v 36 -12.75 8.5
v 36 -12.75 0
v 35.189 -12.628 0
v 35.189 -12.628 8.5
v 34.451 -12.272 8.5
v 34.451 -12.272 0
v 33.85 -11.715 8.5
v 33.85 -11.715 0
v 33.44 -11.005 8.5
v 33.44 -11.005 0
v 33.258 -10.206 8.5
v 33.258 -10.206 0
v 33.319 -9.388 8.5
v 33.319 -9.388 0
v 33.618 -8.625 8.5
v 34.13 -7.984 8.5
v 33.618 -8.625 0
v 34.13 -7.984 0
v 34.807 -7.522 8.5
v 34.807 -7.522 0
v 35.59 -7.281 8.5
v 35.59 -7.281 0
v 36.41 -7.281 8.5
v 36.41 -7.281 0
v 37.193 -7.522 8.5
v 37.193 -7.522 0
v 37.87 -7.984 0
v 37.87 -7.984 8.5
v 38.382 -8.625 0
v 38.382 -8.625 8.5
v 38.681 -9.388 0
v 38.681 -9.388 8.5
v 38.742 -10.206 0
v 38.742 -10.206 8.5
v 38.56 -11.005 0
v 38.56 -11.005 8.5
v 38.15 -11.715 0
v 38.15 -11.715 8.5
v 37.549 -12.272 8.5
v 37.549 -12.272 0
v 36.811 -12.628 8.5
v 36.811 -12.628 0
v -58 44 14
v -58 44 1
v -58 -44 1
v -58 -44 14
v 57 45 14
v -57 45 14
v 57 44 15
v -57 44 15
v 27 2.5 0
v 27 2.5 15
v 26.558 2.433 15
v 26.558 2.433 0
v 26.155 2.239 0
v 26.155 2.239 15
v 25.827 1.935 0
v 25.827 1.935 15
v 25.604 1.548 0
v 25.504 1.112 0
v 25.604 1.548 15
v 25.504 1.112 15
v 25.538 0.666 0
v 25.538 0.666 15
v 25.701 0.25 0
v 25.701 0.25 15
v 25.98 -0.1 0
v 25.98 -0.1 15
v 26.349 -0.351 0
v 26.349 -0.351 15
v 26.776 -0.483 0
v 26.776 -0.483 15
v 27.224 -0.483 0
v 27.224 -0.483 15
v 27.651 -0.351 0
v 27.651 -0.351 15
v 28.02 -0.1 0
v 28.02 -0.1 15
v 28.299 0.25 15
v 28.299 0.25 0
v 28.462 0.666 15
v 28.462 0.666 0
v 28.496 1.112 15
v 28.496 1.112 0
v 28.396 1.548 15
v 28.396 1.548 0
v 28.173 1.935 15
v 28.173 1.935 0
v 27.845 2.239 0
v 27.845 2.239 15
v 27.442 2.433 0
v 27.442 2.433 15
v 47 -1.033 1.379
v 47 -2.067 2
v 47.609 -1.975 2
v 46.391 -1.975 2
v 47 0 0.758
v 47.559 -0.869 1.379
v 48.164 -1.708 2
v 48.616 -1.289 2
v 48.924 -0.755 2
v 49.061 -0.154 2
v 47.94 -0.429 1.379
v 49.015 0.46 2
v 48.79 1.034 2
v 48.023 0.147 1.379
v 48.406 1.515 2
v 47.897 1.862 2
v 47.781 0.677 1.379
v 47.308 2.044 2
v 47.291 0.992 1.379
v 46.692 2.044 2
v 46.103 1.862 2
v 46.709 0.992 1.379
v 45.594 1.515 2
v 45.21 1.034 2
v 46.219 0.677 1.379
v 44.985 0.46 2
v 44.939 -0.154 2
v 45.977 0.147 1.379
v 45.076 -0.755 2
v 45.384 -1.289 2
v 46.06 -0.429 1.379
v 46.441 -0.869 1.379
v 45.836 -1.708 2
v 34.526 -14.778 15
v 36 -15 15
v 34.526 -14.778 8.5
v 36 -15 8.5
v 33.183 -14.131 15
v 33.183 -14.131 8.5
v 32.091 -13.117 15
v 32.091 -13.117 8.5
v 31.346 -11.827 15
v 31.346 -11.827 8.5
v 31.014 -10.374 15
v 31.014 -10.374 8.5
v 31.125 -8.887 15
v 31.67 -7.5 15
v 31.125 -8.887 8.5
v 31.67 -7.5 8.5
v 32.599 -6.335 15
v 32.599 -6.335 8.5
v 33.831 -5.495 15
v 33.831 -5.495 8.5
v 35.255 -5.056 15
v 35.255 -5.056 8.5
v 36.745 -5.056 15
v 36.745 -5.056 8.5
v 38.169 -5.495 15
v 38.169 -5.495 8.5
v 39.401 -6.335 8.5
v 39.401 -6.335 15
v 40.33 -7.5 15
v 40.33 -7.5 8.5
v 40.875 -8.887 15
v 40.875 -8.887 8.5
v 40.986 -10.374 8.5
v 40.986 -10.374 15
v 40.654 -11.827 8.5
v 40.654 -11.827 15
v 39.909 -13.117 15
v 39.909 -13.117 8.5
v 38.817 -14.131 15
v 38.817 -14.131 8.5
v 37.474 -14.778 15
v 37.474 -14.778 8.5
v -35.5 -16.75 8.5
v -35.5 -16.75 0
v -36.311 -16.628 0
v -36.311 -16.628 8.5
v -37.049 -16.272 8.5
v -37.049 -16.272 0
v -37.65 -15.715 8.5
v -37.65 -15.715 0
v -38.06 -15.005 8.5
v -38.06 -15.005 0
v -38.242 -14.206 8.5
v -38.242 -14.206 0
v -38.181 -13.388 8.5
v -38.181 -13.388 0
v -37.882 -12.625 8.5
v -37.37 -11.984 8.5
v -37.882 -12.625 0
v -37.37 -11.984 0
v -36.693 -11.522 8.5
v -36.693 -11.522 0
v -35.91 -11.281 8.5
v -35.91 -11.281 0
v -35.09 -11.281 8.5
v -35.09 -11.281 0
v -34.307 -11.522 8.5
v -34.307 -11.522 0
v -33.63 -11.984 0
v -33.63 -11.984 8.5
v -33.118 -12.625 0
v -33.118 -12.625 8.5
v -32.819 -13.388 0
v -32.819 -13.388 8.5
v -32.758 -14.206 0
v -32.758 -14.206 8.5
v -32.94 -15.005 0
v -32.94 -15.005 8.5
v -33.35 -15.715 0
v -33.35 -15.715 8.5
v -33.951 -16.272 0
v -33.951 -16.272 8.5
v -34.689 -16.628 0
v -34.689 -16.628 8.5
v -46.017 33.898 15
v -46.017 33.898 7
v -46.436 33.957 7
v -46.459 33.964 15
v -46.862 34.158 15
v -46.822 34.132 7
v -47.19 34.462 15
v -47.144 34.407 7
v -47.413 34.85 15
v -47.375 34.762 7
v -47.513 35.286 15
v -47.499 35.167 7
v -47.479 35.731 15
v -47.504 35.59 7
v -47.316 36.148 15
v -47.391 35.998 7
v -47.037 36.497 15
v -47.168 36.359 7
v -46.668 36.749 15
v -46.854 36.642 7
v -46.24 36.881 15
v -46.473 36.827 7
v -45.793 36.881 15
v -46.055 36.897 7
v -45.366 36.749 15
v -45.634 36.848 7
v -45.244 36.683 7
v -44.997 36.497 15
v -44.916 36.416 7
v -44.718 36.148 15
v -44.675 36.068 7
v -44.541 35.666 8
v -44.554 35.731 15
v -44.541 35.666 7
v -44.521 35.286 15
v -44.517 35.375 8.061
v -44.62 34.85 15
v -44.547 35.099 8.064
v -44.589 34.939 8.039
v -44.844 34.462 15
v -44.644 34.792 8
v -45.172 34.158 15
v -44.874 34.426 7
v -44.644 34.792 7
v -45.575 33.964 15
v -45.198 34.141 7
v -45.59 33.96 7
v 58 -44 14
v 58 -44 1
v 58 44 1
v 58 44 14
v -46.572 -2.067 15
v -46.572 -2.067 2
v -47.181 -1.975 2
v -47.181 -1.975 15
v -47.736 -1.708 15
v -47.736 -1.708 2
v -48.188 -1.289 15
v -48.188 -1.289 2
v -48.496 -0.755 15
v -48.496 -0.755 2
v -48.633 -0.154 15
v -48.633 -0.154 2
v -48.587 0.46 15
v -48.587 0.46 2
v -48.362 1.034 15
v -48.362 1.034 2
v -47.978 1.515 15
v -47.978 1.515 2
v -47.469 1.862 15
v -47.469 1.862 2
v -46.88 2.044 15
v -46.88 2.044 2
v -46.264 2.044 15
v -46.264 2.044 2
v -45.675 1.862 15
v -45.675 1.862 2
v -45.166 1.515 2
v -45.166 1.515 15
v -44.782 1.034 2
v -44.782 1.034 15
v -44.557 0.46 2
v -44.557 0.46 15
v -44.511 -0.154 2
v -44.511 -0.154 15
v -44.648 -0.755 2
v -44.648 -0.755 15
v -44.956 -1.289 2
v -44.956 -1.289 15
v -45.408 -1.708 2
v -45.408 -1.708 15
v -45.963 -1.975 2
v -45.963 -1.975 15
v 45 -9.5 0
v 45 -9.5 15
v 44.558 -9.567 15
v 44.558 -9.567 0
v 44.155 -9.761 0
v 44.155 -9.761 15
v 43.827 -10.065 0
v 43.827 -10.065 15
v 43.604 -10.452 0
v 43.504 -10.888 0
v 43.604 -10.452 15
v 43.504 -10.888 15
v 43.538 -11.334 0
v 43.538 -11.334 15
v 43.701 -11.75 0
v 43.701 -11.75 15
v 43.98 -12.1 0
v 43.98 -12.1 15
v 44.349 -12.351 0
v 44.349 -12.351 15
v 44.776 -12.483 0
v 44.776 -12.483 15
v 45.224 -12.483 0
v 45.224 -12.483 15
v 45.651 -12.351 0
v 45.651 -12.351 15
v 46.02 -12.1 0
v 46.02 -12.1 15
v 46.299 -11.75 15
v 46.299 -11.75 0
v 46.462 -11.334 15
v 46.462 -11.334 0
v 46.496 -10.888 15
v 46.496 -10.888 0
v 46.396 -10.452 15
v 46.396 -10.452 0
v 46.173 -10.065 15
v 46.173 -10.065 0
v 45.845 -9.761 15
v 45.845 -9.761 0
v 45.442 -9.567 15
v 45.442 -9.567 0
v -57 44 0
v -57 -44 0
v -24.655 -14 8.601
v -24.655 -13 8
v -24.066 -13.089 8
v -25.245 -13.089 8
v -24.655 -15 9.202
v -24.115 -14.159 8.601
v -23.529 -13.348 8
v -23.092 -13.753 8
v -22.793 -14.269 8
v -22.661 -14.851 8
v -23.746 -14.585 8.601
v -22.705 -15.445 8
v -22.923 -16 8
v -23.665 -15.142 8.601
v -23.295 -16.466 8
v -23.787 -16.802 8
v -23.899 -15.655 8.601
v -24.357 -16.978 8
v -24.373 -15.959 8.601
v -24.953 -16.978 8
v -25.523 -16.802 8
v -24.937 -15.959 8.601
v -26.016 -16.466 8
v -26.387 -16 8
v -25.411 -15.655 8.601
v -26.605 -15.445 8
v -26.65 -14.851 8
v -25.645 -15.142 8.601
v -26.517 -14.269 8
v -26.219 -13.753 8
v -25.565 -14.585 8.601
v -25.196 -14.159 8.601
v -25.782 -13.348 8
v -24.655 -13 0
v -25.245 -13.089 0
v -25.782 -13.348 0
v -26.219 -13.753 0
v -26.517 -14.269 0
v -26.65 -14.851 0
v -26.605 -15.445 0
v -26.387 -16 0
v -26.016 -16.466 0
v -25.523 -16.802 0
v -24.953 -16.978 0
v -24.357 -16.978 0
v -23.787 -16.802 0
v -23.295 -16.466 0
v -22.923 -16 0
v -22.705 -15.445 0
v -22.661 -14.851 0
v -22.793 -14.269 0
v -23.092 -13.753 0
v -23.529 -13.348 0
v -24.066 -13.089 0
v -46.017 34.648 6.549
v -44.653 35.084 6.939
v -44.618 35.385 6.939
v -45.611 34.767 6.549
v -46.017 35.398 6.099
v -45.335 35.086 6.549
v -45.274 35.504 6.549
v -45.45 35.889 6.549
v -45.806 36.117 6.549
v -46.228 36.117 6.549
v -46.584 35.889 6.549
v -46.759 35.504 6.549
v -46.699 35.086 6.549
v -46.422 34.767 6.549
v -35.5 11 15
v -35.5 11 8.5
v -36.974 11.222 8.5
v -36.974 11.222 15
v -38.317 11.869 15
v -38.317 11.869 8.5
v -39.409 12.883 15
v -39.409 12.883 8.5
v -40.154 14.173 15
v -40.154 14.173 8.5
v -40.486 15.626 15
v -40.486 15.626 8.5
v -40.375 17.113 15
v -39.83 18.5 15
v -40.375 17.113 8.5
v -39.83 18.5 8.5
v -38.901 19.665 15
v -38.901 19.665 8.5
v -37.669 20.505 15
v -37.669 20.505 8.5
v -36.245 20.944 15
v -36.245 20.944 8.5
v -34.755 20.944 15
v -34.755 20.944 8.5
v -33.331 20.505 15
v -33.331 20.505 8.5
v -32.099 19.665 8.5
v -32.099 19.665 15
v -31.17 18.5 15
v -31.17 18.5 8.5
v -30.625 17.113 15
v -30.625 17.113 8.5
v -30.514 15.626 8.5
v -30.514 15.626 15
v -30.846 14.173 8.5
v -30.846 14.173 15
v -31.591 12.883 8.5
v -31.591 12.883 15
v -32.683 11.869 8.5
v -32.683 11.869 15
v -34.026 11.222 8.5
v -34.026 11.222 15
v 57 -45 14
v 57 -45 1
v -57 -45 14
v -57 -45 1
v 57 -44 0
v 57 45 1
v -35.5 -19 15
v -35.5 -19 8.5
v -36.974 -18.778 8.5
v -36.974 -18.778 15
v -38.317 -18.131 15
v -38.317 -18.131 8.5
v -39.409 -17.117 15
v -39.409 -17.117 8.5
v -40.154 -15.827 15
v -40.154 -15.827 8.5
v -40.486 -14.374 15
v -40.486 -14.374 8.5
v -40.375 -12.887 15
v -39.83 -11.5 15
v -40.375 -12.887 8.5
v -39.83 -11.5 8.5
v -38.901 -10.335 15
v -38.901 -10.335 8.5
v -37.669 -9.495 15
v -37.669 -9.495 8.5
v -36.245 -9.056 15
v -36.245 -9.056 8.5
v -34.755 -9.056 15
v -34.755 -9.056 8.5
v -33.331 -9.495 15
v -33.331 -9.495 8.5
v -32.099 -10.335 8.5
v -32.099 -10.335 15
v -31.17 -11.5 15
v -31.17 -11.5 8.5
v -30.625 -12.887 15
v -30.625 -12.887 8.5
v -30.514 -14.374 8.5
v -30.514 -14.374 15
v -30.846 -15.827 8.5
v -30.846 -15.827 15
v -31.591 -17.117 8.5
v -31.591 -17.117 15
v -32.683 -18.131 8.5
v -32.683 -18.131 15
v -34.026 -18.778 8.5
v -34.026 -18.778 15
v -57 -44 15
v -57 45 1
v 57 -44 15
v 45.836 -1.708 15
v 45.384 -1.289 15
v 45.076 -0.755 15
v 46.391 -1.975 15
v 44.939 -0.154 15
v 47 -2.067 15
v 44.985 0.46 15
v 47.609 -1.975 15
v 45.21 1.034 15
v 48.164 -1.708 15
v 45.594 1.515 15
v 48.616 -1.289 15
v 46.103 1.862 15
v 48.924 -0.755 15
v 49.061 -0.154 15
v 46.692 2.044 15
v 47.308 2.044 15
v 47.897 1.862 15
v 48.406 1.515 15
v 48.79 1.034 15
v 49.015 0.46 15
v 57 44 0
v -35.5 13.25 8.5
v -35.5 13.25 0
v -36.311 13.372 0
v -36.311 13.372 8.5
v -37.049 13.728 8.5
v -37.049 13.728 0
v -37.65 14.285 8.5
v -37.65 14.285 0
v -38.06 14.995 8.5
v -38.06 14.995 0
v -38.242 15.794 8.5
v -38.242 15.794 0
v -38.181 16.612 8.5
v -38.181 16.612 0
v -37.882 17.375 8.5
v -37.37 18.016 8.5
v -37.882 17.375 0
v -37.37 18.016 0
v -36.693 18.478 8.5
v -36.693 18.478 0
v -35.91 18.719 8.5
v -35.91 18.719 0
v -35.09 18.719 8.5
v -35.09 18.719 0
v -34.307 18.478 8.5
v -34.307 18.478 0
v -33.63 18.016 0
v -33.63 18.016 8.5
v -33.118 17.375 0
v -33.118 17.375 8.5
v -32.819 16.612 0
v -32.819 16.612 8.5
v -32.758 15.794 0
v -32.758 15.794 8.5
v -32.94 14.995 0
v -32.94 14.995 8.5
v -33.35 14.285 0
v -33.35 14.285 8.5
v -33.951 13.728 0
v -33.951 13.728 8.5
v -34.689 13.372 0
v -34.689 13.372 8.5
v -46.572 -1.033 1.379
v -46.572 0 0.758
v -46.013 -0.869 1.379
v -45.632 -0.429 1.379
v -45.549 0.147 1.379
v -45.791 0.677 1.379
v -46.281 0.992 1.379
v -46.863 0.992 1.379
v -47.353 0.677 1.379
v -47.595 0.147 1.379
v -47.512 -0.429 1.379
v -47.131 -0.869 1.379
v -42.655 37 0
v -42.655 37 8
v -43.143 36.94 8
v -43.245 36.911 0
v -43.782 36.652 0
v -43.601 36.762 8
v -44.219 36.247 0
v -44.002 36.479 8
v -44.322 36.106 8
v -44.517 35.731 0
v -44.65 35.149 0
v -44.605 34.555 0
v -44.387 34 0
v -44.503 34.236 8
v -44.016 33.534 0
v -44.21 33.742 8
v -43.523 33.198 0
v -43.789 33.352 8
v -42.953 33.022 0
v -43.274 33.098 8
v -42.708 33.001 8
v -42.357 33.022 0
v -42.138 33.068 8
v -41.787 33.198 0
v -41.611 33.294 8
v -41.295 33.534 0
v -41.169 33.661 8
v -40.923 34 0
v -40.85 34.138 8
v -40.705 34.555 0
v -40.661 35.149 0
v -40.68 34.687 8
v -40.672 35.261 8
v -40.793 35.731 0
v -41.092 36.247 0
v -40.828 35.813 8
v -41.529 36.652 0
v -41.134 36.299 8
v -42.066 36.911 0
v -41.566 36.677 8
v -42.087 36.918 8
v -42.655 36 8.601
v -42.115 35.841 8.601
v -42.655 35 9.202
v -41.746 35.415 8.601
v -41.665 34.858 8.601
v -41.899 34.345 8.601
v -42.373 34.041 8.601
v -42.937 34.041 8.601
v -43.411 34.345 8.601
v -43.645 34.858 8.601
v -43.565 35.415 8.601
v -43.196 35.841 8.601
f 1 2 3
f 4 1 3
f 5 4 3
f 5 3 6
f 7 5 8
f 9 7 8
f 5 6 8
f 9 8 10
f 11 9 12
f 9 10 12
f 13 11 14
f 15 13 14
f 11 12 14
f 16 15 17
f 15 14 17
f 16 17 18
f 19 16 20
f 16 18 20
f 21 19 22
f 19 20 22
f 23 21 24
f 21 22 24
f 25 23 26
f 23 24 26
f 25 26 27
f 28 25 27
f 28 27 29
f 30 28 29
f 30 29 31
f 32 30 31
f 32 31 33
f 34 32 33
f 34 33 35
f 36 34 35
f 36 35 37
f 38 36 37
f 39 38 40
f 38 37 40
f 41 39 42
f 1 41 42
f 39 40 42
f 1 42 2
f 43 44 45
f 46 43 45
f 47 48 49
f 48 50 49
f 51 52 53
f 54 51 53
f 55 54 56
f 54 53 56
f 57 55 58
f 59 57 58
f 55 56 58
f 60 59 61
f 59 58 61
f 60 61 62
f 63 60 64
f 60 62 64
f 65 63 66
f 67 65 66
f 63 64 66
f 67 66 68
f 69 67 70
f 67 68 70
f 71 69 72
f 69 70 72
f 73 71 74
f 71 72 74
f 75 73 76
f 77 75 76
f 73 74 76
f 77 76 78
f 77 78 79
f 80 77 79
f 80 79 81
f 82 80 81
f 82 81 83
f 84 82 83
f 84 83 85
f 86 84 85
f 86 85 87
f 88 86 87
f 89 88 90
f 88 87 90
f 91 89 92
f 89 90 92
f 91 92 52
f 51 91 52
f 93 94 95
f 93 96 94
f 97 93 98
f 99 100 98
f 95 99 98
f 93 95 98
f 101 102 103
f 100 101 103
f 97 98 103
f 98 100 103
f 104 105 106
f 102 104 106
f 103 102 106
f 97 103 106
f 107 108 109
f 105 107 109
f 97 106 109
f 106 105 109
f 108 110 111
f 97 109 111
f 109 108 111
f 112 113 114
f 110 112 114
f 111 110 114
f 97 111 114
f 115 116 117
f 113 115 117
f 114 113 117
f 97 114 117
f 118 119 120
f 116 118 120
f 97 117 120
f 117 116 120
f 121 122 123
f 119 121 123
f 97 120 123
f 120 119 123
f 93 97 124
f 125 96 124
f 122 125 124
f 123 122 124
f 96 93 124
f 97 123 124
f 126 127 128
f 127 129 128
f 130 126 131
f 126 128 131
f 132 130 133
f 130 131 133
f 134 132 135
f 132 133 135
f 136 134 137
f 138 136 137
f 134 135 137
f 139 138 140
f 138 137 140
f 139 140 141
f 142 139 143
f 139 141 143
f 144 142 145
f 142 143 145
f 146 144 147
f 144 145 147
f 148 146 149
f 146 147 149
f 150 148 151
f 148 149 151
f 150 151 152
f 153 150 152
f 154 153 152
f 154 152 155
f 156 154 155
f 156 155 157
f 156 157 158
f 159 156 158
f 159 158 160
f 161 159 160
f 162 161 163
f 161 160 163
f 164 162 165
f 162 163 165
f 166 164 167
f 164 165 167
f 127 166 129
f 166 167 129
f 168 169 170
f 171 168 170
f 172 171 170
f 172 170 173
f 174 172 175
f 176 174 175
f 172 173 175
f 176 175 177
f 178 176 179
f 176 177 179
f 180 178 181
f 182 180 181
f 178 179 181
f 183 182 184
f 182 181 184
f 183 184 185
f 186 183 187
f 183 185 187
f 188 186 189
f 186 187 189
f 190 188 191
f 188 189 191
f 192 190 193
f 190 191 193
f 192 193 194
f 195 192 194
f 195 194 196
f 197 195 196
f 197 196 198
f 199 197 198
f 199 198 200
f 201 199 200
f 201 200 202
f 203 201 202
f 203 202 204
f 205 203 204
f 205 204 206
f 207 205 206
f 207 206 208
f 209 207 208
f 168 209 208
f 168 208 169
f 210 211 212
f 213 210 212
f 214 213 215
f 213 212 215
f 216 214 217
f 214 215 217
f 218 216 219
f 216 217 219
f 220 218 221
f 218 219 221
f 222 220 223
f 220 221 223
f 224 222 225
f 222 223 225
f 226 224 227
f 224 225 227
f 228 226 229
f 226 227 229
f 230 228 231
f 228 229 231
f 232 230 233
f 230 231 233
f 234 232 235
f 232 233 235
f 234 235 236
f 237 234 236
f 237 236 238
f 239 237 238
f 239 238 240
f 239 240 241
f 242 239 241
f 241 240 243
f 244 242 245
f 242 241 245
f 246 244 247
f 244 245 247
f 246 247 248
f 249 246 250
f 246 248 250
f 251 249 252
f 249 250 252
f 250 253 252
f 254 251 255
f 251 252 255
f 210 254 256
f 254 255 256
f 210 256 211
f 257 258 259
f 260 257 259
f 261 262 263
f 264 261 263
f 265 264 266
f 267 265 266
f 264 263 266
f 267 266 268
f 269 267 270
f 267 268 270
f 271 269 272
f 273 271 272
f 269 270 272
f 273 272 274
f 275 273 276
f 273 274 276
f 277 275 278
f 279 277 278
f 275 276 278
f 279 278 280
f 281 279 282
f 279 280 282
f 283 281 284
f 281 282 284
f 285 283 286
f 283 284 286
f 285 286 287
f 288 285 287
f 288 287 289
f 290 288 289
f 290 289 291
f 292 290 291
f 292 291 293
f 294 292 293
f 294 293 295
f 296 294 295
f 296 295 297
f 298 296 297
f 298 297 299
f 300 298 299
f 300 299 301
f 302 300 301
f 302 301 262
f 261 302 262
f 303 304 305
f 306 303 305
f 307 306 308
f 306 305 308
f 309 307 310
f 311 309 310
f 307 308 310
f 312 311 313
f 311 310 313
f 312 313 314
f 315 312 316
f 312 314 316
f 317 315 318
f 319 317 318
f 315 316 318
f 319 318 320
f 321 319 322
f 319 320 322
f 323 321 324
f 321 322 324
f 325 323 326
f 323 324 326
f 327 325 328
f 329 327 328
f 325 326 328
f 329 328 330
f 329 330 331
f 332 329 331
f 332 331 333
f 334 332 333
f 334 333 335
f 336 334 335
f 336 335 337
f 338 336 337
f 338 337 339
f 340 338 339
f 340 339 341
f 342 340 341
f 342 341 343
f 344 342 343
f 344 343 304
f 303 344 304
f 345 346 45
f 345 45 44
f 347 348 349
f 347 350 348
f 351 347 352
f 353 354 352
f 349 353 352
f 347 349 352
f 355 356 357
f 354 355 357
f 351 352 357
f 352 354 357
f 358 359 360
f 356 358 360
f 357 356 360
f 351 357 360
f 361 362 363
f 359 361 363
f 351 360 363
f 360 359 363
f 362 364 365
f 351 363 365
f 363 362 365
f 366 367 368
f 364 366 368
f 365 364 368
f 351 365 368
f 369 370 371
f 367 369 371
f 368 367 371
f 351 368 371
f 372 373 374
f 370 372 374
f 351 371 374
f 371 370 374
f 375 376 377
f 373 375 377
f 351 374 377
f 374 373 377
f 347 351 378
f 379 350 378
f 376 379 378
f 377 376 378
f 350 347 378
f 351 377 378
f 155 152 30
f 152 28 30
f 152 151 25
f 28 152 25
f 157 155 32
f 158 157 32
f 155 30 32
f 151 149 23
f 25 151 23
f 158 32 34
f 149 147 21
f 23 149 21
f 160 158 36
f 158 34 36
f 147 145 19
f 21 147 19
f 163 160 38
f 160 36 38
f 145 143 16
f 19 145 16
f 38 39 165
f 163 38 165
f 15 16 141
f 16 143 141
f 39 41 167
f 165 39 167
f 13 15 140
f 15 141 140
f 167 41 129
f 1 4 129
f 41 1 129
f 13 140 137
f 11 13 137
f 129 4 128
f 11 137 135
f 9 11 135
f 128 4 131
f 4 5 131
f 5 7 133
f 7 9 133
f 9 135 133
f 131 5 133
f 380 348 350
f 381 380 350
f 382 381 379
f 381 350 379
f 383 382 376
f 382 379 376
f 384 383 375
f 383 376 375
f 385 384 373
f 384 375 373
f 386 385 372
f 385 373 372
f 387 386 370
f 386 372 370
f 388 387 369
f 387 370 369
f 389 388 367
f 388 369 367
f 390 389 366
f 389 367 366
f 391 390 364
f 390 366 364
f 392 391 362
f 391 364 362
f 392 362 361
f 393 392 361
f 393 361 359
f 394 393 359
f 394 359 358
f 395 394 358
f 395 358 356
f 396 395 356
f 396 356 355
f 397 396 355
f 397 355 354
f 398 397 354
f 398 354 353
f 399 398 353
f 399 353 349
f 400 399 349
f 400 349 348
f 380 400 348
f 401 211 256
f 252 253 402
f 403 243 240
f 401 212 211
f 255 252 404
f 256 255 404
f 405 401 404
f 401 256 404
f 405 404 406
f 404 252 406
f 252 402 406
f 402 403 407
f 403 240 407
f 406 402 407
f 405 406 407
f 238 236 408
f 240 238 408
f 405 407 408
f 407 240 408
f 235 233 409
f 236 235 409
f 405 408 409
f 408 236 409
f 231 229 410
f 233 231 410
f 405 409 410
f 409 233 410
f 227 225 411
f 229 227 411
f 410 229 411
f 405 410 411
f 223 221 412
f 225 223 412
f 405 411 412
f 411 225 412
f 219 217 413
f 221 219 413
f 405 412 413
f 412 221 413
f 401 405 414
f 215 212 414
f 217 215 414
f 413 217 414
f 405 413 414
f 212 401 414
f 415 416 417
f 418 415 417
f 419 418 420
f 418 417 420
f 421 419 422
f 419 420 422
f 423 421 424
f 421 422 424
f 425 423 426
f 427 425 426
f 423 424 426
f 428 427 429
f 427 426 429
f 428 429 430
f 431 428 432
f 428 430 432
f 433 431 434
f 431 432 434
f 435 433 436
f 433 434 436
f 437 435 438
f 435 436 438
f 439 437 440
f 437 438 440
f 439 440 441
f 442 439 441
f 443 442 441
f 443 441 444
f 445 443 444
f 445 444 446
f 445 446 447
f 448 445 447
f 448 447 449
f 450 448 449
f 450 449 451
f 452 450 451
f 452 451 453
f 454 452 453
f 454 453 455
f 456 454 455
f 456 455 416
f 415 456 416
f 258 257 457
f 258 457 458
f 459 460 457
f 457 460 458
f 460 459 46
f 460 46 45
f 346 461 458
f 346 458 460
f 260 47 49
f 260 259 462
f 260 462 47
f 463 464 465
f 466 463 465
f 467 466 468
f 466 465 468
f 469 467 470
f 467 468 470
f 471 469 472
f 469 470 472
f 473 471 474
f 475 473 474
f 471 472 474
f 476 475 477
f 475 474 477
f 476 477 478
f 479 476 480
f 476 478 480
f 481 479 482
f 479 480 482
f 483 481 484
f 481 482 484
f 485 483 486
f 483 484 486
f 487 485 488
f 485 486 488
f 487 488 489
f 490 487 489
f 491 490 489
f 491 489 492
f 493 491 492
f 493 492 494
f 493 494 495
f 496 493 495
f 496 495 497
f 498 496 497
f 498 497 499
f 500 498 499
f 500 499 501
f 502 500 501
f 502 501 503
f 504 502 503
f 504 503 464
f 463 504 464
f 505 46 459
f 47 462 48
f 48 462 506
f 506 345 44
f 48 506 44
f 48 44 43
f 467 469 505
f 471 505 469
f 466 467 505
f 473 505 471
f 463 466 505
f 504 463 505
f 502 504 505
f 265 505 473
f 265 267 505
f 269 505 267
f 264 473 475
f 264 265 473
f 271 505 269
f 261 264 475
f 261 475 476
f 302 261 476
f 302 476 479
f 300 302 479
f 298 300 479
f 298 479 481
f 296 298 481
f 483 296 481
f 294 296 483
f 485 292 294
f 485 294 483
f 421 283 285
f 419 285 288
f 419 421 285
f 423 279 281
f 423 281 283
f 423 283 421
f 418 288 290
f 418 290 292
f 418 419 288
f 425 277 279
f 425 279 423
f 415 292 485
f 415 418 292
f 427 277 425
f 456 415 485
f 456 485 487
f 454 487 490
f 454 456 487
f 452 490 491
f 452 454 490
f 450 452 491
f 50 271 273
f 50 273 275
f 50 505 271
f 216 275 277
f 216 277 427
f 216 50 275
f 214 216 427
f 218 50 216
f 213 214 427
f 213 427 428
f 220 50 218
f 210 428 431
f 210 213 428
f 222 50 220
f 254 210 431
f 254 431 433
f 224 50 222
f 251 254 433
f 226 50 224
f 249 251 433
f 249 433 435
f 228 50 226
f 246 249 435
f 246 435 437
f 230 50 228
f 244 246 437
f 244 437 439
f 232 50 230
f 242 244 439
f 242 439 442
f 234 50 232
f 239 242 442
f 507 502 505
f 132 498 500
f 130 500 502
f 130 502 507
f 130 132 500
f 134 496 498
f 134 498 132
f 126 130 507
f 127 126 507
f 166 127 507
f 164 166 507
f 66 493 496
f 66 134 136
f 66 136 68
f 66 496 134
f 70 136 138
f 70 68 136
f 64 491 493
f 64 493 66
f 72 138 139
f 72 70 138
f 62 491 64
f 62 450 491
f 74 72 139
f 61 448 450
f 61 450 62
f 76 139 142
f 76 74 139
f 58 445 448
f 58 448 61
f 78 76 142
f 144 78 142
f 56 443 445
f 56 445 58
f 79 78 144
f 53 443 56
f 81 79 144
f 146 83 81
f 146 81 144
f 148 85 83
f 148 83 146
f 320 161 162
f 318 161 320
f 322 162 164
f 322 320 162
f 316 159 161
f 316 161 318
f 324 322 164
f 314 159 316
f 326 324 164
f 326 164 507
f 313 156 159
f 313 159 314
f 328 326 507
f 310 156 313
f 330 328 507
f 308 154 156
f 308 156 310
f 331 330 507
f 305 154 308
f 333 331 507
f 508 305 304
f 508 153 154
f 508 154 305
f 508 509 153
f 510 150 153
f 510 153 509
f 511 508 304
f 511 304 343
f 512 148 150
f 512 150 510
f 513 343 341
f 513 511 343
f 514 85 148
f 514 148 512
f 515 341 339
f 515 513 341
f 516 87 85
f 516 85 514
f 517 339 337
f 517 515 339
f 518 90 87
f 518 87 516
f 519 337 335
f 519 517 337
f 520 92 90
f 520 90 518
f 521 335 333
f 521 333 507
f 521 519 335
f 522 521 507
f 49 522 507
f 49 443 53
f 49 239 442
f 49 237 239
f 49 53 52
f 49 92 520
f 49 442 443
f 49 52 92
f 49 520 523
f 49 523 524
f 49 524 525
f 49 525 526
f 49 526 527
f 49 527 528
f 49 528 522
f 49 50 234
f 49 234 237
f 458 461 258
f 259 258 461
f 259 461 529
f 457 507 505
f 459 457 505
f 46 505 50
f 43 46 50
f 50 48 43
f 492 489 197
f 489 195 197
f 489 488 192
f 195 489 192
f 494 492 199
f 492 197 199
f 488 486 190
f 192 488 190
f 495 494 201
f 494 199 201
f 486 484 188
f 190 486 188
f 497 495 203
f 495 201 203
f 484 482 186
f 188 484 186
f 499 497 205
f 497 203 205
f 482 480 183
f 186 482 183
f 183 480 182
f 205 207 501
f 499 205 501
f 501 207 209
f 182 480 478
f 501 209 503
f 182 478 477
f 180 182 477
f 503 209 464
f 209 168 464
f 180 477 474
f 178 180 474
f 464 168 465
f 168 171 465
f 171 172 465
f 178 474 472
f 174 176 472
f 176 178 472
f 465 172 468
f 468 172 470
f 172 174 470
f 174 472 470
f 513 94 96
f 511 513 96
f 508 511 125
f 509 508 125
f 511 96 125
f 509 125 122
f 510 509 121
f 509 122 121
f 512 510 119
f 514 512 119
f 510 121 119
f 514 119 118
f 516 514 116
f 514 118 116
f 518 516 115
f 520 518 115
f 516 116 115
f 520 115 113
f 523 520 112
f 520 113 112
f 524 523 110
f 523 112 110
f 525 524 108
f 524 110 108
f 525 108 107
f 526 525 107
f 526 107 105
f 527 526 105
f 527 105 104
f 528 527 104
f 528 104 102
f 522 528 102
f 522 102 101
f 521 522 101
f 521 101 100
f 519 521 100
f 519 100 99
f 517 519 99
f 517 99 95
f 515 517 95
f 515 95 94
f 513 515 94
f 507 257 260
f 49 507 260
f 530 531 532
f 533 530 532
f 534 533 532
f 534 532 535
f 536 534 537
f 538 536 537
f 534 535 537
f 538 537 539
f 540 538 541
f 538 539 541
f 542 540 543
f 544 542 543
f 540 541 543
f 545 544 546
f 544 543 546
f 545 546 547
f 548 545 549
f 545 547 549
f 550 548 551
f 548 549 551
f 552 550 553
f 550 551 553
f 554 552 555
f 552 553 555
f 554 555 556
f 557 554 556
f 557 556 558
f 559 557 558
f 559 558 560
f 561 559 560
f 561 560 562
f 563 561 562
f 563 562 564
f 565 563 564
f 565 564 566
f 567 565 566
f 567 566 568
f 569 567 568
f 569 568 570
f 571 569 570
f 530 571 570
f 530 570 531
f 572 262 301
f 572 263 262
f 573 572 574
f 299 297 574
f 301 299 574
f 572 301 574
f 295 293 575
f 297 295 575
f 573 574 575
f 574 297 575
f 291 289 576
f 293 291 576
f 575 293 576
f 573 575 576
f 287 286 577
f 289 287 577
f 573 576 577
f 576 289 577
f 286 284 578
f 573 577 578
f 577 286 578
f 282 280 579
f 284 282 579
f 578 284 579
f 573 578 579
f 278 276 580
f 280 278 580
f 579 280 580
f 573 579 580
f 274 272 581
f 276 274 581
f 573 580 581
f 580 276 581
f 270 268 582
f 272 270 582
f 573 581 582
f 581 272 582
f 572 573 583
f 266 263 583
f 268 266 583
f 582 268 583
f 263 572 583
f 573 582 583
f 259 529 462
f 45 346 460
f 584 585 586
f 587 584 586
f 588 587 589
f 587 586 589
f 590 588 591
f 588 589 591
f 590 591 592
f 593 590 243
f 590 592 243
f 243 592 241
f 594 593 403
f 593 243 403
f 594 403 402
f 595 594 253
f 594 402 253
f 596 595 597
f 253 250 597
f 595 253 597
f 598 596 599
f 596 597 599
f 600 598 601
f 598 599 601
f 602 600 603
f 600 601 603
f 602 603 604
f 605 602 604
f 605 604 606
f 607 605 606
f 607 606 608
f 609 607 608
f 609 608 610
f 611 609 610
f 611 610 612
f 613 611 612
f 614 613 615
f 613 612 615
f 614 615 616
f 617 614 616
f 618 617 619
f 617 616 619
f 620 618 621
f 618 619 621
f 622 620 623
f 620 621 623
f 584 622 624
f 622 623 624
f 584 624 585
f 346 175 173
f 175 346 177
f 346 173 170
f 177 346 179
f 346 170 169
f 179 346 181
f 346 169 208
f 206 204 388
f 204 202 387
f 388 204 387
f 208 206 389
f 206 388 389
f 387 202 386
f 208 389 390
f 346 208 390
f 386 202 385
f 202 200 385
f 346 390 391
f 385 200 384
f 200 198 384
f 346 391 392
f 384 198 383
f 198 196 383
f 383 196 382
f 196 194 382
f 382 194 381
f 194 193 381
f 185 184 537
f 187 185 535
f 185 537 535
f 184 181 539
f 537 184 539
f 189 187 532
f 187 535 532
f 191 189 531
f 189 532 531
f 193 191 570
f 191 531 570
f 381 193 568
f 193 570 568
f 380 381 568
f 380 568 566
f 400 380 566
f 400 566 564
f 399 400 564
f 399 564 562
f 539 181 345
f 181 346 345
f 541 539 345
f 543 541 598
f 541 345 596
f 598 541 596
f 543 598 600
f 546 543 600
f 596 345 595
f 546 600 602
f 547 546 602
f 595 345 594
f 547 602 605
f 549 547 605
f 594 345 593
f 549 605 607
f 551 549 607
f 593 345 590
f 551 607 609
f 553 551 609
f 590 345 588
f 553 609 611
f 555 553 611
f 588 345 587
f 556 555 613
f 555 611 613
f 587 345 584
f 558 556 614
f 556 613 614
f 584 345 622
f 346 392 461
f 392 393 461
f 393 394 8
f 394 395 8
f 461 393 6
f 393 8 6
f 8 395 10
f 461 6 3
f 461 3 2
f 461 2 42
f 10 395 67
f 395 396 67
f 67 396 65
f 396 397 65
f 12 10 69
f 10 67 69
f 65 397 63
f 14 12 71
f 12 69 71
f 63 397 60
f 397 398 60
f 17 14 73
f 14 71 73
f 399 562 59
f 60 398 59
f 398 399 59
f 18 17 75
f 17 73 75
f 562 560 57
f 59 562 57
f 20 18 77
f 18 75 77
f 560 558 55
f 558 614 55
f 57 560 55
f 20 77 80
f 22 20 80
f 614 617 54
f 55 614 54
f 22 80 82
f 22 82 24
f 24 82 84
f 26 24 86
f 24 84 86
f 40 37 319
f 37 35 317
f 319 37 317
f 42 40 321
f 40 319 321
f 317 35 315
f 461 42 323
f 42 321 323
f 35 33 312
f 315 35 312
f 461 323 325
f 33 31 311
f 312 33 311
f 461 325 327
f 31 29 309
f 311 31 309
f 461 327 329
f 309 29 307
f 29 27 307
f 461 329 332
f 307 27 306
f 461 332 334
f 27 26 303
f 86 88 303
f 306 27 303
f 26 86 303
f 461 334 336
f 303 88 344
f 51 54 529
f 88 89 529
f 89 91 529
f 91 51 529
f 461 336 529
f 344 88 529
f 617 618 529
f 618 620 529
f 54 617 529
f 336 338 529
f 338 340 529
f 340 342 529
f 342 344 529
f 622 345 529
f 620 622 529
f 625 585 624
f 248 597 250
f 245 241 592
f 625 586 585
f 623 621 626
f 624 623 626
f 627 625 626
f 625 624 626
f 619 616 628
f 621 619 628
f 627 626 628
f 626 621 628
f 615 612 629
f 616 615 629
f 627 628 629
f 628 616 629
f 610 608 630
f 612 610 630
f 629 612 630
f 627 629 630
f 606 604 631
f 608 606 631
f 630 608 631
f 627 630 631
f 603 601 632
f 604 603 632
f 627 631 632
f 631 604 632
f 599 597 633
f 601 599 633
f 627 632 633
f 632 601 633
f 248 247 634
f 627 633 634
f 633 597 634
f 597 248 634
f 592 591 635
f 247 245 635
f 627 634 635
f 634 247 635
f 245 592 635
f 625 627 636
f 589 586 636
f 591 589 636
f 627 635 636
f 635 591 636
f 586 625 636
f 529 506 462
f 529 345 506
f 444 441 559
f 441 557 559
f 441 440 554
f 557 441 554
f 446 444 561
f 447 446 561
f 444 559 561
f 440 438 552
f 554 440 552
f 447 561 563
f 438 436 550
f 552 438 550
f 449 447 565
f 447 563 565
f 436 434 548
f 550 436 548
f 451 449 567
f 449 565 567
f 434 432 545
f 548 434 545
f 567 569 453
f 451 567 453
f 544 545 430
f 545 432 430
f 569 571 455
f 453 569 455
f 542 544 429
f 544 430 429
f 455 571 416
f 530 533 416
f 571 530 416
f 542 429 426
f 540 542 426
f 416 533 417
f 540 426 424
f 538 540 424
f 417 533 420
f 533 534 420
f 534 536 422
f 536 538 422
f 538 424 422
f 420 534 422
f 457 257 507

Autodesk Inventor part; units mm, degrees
ref_plane "YZ Plane" through (0, 0, 0) normal (1, 0, 0) x (0, 1, 0)
ref_plane "XZ Plane" through (0, 0, 0) normal (0, 1, 0) x (-1, 0, 0)
ref_plane "XY Plane" through (0, 0, 0) normal (0, 0, 1) x (1, 0, 0)
sketch "Skizze1" plane through (0, 0, 0) normal (0, 0, 1) x (1, 0, 0)
  line L0 (-58, -45) -> (58, -45)
  line L1 (58, -45) -> (58, 45)
  line L2 (58, 45) -> (-58, 45)
  line L3 (-58, 45) -> (-58, -45)
  line L4 (-58, -45) -> (58, 45) construction
  line L5 (58, -45) -> (-58, 45) construction
  point P0 (0, 0)
  dimension "d0" = 116
  dimension "d1" = 90
extrude "Extrusion1" add sketch "Skizze1" along normal blind 15
sketch "Skizze2" plane through (0, 0, 15) normal (0, 0, 1) x (1, 0, 0)
  line L0 (58, -45) -> (58, 45) projected
  point P0 (0, 0)
  point P1 (47, 0)
  point P2 (58, 0)
  dimension "d11" = 11
hole "Bohrung1" at (47, 0, 15) direction (0, 0, -1) diameter 4.134 depth 13 tip angle 118 thread size "M5x0.8" class "6H" standard "ISO Metric profile"
sketch "Skizze4" plane through (0, 0, 15) normal (0, 0, 1) x (1, 0, 0)
  line L0 (-58, -45) -> (58, -45) projected
  line L1 (58, -45) -> (58, 45) projected
  point P0 (0, 0)
  point P1 (-35.5, 16)
  point P2 (36, -10)
  dimension "d20" = 35
  dimension "d21" = 61
  dimension "d22" = 22
  dimension "d23" = 71.5
hole "Bohrung3" at (-35.5, 16, 15) at (36, -10, 15) direction (0, 0, -1) diameter 5.5 end through all counterbore diameter 10 counterbore depth 6.5
sketch "Skizze5" plane through (0, 0, 15) normal (0, 0, 1) x (1, 0, 0)
  line L0 (-58, 45) -> (-58, -45) projected
  circle A0 centre (47, 0) radius 2.067 projected
  point P0 (0, 0)
  point P1 (-46.5721, 0)
  point P2 (-58, 0)
  dimension "d38" = 93.5721
hole "Bohrung4" at (-46.5721, 0, 15) direction (0, 0, -1) diameter 4.134 depth 13 tip angle 118 thread size "M5x0.8" class "6H" standard "ISO Metric profile"
sketch "Skizze6" plane through (0, 0, 15) normal (0, 0, 1) x (1, 0, 0)
  circle A0 centre (-35.5, 16) radius 2.75 projected
  point P0 (0, 0)
  point P1 (-35.5, -14)
  dimension "d39" = 30
hole "Bohrung5" at (-35.5, -14, 15) direction (0, 0, -1) diameter 5.5 depth 15 counterbore diameter 10 counterbore depth 6.5
sketch "Skizze7" plane through (0, 0, 15) normal (0, 0, 1) x (1, 0, 0)
  point P0 (0, 0)
  point P1 (-46.0168, 35.3976)
hole "Bohrung6" at (-46.0168, 35.3976, 15) direction (0, 0, -1) diameter 3 depth 8 tip angle 118
sketch "Skizze8" plane through (0, 0, 0) normal (0, 0, -1) x (-1, 0, 0)
  line L0 (58, -45) -> (-58, -45) projected
  line L1 (58, 45) -> (58, -45) projected
  point P0 (0, 0)
  point P1 (42.6552, 35)
  point P2 (24.6552, -15)
  point P3 (58, 0)
  dimension "d61" = 50
  dimension "d62" = 30
  dimension "d63" = 18
hole "Bohrung7" at (-42.6552, 35, 0) at (-24.6552, -15, 0) direction (0, 0, 1) diameter 4 depth 8 tip angle 118
sketch "Skizze10" plane through (0, 0, 0) normal (0, 0, -1) x (-1, 0, 0)
  line L0 (-58, -45) -> (-58, 45) projected
  line L1 (58, -45) -> (-58, -45) projected
  point P0 (0, 0)
  point P1 (-27, 1)
  point P2 (-45, -11)
  dimension "d71" = 18
  dimension "d72" = 31
  dimension "d73" = 34
  dimension "d74" = 12
hole "Bohrung8" at (27, 1, 0) at (45, -11, 0) direction (0, 0, 1) diameter 3 end through all
chamfer "Fasen1" distance 1 angle 45 12 edges at (58, 0, 0) (0, 45, 0) (-58, 0, 0) (0, -45, 0) (0, 45, 15) (-58, 45, 7.5) (58, 45, 7.5) (-58, 0, 15) (58, 0, 15) (-58, -45, 7.5) (58, -45, 7.5) (0, -45, 15)
properties part number "Grundplatte" material "Glas"
